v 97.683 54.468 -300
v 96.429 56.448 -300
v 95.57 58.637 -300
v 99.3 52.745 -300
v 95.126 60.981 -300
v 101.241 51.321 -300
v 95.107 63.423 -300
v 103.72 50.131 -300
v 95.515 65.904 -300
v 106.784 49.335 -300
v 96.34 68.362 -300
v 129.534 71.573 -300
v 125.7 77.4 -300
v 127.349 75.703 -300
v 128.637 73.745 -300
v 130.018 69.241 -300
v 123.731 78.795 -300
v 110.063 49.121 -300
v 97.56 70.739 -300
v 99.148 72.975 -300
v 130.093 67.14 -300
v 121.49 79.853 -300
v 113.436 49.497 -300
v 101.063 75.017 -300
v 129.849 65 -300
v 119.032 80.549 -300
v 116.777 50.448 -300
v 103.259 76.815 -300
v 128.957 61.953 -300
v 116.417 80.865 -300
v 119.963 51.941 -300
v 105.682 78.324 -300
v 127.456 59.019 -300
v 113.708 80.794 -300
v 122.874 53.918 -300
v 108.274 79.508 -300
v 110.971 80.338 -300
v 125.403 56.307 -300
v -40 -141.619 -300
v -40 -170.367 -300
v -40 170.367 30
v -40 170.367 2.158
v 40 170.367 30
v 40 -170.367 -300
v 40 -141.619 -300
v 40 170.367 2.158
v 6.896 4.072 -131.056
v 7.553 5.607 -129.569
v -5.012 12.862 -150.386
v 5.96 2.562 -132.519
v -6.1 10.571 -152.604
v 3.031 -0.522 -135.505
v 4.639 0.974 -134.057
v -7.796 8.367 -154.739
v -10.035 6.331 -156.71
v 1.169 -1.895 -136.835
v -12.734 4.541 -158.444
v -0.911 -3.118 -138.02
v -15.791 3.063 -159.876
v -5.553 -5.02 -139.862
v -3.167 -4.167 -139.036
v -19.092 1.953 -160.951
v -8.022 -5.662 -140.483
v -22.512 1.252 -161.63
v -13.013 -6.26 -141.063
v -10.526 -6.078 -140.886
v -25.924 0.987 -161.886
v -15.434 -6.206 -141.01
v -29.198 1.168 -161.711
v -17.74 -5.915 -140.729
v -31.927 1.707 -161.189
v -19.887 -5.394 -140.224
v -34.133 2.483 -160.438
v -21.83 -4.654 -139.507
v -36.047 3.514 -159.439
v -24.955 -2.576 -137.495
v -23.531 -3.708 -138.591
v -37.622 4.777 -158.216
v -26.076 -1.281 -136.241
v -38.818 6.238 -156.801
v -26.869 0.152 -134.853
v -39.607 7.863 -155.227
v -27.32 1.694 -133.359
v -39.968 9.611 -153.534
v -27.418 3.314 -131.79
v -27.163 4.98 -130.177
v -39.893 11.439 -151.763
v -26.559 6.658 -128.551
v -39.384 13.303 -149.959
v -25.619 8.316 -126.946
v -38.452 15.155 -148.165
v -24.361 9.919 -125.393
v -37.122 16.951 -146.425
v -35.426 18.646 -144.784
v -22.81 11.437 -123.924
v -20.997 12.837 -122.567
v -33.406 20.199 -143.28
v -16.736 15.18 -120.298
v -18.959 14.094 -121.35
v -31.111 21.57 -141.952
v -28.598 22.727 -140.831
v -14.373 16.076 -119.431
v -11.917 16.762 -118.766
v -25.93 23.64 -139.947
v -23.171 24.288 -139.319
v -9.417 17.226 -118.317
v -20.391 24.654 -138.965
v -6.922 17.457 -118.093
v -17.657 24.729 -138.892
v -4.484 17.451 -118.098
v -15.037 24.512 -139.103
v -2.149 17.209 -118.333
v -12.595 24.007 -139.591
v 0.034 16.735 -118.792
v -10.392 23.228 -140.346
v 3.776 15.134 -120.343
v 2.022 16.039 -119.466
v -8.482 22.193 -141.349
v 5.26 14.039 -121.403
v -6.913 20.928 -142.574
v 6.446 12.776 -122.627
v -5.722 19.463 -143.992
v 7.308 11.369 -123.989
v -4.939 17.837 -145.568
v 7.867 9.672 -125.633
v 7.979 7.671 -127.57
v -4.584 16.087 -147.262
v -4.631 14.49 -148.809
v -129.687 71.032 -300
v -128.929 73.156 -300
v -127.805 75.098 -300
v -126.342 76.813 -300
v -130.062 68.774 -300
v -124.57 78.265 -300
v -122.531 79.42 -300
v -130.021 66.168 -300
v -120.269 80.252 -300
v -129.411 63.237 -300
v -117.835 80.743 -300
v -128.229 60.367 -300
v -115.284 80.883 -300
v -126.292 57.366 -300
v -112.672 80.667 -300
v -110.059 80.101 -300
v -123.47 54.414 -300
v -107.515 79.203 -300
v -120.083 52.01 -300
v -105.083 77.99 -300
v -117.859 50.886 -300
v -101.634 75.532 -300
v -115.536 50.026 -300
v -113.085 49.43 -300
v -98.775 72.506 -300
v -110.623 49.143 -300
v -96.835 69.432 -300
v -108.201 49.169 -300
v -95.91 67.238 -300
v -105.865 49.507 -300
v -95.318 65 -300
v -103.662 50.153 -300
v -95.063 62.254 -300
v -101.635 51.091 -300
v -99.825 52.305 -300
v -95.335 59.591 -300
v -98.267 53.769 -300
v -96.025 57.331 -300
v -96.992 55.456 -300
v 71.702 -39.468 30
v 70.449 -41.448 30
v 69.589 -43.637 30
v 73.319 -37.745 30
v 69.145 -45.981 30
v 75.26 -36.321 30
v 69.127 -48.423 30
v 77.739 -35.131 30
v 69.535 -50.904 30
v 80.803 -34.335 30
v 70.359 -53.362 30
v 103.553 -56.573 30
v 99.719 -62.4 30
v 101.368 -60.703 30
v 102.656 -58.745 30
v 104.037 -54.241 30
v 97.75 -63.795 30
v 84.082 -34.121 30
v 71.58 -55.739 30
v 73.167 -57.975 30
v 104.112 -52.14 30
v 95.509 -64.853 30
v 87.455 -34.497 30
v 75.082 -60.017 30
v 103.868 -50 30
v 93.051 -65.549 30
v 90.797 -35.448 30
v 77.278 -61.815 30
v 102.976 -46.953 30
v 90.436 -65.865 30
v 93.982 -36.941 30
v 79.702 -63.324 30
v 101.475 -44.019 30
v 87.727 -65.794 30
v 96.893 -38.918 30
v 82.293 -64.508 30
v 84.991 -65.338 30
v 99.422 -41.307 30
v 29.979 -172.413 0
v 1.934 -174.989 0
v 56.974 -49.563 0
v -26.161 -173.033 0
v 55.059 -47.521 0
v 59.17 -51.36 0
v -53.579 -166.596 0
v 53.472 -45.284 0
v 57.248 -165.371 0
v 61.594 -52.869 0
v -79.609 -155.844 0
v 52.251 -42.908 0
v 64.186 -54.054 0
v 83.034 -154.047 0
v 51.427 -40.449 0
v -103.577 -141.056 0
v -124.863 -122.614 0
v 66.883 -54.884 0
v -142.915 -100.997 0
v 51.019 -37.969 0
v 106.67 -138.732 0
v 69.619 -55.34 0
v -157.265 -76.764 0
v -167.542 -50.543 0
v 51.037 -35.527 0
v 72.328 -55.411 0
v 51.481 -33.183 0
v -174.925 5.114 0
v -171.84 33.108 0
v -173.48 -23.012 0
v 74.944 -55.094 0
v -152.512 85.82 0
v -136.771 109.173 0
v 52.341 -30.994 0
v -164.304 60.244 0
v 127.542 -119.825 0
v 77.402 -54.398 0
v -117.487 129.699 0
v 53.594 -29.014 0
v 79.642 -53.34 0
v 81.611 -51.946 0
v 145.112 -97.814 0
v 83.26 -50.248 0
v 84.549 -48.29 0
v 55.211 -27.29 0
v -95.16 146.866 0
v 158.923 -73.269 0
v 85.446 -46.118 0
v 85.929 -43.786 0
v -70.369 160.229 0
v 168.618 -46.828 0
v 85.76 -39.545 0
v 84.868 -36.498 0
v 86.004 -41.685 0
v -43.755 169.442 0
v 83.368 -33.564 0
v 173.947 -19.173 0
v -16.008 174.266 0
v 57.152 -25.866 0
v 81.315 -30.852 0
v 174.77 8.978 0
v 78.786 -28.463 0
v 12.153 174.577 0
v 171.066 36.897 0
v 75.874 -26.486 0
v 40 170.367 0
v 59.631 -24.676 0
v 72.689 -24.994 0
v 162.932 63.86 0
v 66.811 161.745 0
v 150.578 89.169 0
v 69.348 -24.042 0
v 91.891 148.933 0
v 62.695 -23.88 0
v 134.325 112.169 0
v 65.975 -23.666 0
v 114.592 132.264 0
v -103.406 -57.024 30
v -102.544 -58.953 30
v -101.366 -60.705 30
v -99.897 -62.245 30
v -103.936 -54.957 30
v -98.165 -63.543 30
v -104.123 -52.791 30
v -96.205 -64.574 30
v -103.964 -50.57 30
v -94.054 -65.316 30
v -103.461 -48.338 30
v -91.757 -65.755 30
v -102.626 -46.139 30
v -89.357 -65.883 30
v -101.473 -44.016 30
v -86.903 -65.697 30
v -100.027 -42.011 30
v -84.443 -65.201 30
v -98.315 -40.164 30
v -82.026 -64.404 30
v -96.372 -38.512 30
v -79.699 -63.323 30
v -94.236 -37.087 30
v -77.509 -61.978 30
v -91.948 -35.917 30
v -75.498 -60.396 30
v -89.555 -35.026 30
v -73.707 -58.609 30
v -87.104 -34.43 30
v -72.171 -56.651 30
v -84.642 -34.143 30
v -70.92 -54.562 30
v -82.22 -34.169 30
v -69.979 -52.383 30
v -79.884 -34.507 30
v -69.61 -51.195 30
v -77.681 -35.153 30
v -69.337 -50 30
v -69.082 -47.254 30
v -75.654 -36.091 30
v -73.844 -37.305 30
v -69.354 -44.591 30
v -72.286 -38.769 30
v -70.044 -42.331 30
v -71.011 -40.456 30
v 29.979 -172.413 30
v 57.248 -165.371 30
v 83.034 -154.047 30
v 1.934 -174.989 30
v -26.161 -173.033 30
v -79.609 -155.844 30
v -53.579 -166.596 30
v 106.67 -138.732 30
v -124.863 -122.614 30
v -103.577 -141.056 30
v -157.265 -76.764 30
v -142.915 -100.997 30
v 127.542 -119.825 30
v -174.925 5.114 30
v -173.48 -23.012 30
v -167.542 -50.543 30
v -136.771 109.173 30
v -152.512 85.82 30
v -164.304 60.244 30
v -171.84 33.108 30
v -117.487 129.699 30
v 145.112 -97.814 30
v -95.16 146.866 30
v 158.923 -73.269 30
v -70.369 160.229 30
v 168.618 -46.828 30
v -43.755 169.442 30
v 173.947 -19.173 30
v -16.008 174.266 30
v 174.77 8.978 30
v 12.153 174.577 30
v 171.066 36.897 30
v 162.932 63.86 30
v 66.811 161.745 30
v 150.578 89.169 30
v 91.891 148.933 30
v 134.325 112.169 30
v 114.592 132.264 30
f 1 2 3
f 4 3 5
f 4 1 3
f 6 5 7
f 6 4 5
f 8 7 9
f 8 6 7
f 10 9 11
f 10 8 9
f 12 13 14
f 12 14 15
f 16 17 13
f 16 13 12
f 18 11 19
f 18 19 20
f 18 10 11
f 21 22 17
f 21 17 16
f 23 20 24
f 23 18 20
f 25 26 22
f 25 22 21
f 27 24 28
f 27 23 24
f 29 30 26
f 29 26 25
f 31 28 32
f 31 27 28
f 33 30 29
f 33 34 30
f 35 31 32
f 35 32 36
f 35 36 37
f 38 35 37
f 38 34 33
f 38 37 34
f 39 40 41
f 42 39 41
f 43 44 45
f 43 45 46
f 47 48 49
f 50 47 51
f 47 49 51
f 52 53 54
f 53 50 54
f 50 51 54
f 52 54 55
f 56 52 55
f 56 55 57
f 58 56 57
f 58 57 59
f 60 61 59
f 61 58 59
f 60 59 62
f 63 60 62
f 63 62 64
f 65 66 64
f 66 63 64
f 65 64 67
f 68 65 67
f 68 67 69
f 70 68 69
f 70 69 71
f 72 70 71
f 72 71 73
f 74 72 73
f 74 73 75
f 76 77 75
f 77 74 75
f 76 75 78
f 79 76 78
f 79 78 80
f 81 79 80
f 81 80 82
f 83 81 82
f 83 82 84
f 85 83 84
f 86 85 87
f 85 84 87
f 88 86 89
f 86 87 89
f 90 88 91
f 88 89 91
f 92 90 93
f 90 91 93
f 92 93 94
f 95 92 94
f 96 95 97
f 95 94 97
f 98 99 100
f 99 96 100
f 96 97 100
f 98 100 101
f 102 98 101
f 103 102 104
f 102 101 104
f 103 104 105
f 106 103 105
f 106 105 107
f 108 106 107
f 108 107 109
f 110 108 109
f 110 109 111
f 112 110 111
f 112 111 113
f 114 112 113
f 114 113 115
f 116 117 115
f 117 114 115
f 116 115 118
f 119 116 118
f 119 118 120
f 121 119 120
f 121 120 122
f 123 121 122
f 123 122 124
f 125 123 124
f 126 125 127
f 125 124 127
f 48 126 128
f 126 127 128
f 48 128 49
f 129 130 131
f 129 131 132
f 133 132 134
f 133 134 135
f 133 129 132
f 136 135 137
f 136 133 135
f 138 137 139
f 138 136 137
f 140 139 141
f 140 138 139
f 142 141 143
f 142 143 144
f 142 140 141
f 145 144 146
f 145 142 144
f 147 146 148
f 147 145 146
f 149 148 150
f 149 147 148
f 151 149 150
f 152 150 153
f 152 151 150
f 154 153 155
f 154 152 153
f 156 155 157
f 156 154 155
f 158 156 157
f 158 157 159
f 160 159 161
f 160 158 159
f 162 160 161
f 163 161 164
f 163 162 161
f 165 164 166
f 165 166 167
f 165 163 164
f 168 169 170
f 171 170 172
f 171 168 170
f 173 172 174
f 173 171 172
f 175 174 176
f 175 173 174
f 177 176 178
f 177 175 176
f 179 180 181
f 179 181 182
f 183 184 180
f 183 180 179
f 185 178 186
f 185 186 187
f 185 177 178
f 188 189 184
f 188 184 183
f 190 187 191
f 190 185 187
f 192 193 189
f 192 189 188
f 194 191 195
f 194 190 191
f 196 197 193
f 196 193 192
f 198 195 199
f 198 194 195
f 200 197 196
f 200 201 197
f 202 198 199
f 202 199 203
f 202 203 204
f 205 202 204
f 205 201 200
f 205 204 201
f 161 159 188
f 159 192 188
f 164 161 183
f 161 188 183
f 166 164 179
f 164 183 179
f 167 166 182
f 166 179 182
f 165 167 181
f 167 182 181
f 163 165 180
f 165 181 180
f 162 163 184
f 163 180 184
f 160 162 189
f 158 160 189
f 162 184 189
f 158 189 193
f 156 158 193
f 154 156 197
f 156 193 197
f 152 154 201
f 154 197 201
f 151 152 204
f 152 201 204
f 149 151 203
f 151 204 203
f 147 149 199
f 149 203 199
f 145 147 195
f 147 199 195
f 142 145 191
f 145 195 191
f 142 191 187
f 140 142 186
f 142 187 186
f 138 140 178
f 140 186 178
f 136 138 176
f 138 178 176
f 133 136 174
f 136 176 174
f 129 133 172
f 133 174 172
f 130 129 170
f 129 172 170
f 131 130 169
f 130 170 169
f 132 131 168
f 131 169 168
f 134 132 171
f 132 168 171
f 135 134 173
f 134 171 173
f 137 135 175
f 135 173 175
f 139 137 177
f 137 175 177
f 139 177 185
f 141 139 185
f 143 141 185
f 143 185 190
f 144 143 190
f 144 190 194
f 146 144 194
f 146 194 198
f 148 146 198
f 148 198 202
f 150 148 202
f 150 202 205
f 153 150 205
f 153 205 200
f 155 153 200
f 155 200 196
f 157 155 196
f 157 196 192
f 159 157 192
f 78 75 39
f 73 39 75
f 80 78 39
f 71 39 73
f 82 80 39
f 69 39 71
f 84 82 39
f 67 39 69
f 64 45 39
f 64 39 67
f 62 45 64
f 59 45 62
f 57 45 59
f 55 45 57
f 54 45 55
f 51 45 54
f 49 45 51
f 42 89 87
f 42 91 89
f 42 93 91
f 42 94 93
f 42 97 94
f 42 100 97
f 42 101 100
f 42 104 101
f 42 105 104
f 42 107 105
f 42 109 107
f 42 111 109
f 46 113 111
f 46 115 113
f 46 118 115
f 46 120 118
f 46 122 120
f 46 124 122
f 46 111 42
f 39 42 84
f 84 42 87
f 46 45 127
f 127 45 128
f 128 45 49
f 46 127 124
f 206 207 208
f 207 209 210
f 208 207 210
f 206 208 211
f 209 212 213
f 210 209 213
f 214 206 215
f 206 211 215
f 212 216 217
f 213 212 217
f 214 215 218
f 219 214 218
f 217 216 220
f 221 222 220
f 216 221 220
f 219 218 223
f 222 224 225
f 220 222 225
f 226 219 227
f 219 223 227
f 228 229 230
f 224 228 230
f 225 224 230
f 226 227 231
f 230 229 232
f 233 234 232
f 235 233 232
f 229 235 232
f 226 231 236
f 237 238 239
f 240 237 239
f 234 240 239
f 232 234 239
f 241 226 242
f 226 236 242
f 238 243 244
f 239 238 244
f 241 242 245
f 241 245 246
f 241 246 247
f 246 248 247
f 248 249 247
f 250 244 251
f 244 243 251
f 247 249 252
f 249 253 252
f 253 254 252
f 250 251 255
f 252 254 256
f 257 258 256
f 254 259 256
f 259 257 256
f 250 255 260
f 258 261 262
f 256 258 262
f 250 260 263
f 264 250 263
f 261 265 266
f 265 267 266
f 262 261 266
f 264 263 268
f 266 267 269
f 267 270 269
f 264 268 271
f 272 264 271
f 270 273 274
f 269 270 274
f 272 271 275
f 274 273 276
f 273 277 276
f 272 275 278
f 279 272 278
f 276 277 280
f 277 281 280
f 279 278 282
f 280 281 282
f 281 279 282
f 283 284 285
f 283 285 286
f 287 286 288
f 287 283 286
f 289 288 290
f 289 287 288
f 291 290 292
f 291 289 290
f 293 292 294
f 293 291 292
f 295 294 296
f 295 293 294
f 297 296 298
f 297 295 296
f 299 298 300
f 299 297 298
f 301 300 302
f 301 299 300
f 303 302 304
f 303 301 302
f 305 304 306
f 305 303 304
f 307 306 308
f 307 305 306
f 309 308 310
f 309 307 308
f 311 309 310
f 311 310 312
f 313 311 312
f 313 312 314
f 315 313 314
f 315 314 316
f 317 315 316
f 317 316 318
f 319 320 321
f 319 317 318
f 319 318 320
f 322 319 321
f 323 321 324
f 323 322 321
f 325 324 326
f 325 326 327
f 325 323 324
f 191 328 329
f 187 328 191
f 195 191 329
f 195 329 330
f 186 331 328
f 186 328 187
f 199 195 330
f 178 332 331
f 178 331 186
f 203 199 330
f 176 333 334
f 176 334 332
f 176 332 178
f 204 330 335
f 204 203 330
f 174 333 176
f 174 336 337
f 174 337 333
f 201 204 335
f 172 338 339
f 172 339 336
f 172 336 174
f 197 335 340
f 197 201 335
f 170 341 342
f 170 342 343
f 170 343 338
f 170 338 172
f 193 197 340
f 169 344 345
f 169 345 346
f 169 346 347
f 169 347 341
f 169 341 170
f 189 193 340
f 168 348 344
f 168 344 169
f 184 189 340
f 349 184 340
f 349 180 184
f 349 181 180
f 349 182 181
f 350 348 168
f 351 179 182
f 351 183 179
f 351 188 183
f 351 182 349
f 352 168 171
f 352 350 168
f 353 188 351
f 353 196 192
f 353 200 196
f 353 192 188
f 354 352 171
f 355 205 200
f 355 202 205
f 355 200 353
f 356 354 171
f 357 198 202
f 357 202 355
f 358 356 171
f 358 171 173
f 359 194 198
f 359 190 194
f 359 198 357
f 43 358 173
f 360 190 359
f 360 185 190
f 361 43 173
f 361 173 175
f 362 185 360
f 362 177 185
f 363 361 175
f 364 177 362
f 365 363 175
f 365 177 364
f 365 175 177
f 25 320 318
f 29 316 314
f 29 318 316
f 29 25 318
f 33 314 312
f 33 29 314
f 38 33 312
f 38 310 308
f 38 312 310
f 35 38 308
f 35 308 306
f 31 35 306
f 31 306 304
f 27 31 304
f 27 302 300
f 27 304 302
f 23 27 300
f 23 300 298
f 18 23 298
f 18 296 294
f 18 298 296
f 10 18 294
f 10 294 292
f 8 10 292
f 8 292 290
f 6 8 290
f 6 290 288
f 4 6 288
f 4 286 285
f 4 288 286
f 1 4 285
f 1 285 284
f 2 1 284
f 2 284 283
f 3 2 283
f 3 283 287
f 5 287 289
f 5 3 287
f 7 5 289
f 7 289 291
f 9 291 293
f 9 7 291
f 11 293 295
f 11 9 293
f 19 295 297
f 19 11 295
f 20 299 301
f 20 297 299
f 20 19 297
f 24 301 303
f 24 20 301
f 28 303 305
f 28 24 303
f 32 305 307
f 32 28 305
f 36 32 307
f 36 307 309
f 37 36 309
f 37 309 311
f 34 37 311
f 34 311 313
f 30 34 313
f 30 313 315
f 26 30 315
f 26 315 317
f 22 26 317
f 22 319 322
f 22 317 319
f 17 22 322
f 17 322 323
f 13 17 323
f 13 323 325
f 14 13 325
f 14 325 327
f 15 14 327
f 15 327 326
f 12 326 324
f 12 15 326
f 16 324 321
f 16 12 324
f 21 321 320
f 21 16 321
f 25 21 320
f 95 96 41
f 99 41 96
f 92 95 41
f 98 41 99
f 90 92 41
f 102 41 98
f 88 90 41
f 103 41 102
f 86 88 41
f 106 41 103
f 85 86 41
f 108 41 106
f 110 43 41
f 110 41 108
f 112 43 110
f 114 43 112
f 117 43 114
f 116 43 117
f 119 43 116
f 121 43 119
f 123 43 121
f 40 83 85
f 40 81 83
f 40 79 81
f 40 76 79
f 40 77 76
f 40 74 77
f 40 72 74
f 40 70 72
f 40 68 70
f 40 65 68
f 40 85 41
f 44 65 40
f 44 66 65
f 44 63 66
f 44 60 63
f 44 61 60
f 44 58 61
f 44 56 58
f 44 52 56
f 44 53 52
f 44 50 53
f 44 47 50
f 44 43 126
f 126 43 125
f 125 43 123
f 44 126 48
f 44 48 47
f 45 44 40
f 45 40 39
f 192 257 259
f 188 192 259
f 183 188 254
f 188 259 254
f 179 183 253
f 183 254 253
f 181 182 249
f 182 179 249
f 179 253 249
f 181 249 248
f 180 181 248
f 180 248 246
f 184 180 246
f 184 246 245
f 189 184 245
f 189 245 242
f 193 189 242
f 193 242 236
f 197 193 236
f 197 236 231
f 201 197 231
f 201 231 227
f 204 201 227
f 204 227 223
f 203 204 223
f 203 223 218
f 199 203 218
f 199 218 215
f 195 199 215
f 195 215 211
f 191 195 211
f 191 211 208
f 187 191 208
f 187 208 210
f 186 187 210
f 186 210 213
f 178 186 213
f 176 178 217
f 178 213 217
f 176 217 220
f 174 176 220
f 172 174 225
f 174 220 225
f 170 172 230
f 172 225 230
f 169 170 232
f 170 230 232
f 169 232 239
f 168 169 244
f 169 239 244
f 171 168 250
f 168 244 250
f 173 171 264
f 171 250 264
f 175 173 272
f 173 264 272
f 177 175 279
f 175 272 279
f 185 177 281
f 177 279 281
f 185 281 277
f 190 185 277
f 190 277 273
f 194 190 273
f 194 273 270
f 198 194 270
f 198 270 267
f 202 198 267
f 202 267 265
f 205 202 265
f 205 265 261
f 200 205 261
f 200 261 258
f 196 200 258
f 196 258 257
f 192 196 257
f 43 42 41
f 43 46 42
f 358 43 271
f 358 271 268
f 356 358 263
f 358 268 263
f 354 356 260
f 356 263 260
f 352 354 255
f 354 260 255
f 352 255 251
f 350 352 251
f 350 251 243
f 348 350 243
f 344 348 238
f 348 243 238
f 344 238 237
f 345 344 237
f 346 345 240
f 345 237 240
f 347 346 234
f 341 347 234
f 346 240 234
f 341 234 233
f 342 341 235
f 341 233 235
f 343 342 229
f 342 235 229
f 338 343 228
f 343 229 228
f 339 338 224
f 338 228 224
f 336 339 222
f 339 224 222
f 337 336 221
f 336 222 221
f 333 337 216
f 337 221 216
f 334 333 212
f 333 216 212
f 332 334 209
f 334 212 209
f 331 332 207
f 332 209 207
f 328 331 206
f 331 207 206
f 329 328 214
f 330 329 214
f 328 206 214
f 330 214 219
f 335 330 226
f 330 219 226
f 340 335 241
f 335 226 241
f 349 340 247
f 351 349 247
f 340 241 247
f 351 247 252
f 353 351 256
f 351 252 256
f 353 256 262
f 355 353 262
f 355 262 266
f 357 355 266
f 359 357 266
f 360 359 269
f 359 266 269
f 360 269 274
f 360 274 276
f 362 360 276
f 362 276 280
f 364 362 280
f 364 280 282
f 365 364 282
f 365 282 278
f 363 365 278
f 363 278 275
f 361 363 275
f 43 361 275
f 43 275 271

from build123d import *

# Parameters (mm, degrees)
F0_W           = 80
F0_H           = 300.734500748
F0_H_2         = 20
F1_DEPTH       = 30
F4_DEPTH       = 40
F8_R           = 15
F9_DEPTH       = 481.7550188272
F10_DEPTH      = 481.7550188272
F11_DEPTH      = 481.7550188272
F11_DEPTH_BACK = 50
F13_DEPTH      = 49.5977982638
F14_W          = 425
F14_H          = 300
F15_DEPTH      = 73.8088242034
F20_R          = 15
F21_REACH      = 574.1814256984
F23_DEPTH      = 49.5977982638


with BuildPart() as f1:
    # F0 (on Top) → F1 (new body)
    with BuildSketch(Plane.XY):
        with BuildLine():
            Line((-40, 150.367250374), (-40, 170.367250374))
            ThreePointArc((-40, 170.367250374), (-175, 0), (-40, -170.367250374))
            Line((-40, -170.367250374), (-40, -150.367250374))
            Line((-40, -150.367250374), (-40, 150.367250374))
        make_face()
        Rectangle(F0_W, F0_H)
        with Locations((0, 160.367250374)):
            Rectangle(F0_W, F0_H_2)
        with BuildLine():
            Line((-40, 170.367250374), (40, 170.367250374))
            ThreePointArc((40, 170.367250374), (0, 175), (-40, 170.367250374))
        make_face()
        with BuildLine():
            ThreePointArc((40, -170.367250374), (137.1586672435, -108.6853255964), (175, 0))
            ThreePointArc((175, 0), (137.1586672435, 108.6853255964), (40, 170.367250374))
            Line((40, 170.367250374), (40, 150.367250374))
            Line((40, 150.367250374), (40, -150.367250374))
            Line((40, -150.367250374), (40, -170.367250374))
        make_face()
        with Locations((0, -160.367250374)):
            Rectangle(F0_W, F0_H_2)
        with BuildLine():
            ThreePointArc((-40, -170.367250374), (0, -175), (40, -170.367250374))
            Line((40, -170.367250374), (-40, -170.367250374))
        make_face()
    extrude(amount=F1_DEPTH)


with BuildPart() as f4:
    # F3 (on Right) → F4 (new body, symmetric)
    with BuildSketch(Plane.YZ):
        Polygon((170.367250374, 2.1576976805), (170.367250374, 30), (-170.367250374, -300), (-141.6192716452, -300), align=None)
    extrude(amount=F4_DEPTH, both=True)


with BuildPart() as f9_tool:
    # F8 (on line) → F9 (new body, through all)
    with BuildSketch(Plane(origin=(-158.6839007787, 91.6161928307, -262.8986402967), x_dir=(0.8687864318, 0.1629539008, -0.4676068457), z_dir=(-0.4951869707, 0.2858963308, -0.8203981668))):
        with Locations((53.0632116259, 37.3429156197)):
            Circle(F8_R)
    extrude(amount=-F9_DEPTH)


with BuildPart() as f1_1:
    add(f1.part)

    # F9: cut by f9_tool
    add(f9_tool.part, mode=Mode.SUBTRACT)

    # F8 (on line) → F10 (cut, through all)
    with BuildSketch(Plane(origin=(-158.6839007787, 91.6161928307, -262.8986402967), x_dir=(0.8687864318, 0.1629539008, -0.4676068457), z_dir=(-0.4951869707, 0.2858963308, -0.8203981668))):
        with Locations((53.0632116259, 37.3429156197)):
            Circle(F8_R)
    extrude(amount=-F10_DEPTH, mode=Mode.SUBTRACT)


with BuildPart() as f4_1:
    add(f4.part)

    # F9: cut by f9_tool
    add(f9_tool.part, mode=Mode.SUBTRACT)


with BuildPart() as f11:
    # F8 (on line) → F11 (new body, two sides)
    with BuildSketch(Plane(origin=(-158.6839007787, 91.6161928307, -262.8986402967), x_dir=(0.8687864318, 0.1629539008, -0.4676068457), z_dir=(-0.4951869707, 0.2858963308, -0.8203981668))) as f11_sk:
        with Locations((53.0632116259, 37.3429156197)):
            Circle(F8_R)
    extrude(amount=-F11_DEPTH)
    extrude(f11_sk.sketch, amount=F11_DEPTH_BACK)

    # F12 (on face) → F13 (cut, through all)
    with BuildSketch(Plane(origin=(0, 0, -300), x_dir=(1, 0, 0), z_dir=(0, 0, -1))):
        Polygon((-40, 141.6192716452), (-40, 170.367250374), (-160, 170.367250374), (-160, -119.632749626), (40, -119.632749626), (40, 141.6192716452), align=None)
    extrude(amount=F13_DEPTH, mode=Mode.SUBTRACT)

    # F14 (on face) → F15 (cut, through all)
    with BuildSketch(Plane.XY.offset(30)):
        Rectangle(F14_W, F14_H)
    extrude(amount=F15_DEPTH, mode=Mode.SUBTRACT)


with BuildPart() as f21:
    f21_end = f1_1.part.faces().sort_by_distance((-0.7825626972, 0.4518127839, 30))[0]
    # F20 (on line) → F21 (new body, up to a face of F1 that its end follows)
    with BuildSketch(Plane(origin=(183.4432493147, 105.9110093729, -303.9185486352), x_dir=(0.8687864318, -0.1629539008, 0.4676068457), z_dir=(0.4951869707, 0.2858963308, -0.8203981668))):
        with Locations((-53.0632116259, 37.3429156197)):
            Circle(F20_R)
    f21_long = extrude(amount=-F21_REACH, mode=Mode.PRIVATE)
    add(split(f21_long, bisect_by=f21_end, keep=Keep.BOTTOM, mode=Mode.PRIVATE))

    # F22 (on face) → F23 (cut, through all)
    with BuildSketch(Plane(origin=(0, 0, -300), x_dir=(1, 0, 0), z_dir=(0, 0, -1))):
        Polygon((260, 170.367250374), (40, 170.367250374), (40, 141.6192716452), (-40, 141.6192716452), (-40, -129.632749626), (260, -129.632749626), align=None)
    extrude(amount=F23_DEPTH, mode=Mode.SUBTRACT)


solid = Compound([f1_1.part, f4_1.part, f11.part, f21.part])
